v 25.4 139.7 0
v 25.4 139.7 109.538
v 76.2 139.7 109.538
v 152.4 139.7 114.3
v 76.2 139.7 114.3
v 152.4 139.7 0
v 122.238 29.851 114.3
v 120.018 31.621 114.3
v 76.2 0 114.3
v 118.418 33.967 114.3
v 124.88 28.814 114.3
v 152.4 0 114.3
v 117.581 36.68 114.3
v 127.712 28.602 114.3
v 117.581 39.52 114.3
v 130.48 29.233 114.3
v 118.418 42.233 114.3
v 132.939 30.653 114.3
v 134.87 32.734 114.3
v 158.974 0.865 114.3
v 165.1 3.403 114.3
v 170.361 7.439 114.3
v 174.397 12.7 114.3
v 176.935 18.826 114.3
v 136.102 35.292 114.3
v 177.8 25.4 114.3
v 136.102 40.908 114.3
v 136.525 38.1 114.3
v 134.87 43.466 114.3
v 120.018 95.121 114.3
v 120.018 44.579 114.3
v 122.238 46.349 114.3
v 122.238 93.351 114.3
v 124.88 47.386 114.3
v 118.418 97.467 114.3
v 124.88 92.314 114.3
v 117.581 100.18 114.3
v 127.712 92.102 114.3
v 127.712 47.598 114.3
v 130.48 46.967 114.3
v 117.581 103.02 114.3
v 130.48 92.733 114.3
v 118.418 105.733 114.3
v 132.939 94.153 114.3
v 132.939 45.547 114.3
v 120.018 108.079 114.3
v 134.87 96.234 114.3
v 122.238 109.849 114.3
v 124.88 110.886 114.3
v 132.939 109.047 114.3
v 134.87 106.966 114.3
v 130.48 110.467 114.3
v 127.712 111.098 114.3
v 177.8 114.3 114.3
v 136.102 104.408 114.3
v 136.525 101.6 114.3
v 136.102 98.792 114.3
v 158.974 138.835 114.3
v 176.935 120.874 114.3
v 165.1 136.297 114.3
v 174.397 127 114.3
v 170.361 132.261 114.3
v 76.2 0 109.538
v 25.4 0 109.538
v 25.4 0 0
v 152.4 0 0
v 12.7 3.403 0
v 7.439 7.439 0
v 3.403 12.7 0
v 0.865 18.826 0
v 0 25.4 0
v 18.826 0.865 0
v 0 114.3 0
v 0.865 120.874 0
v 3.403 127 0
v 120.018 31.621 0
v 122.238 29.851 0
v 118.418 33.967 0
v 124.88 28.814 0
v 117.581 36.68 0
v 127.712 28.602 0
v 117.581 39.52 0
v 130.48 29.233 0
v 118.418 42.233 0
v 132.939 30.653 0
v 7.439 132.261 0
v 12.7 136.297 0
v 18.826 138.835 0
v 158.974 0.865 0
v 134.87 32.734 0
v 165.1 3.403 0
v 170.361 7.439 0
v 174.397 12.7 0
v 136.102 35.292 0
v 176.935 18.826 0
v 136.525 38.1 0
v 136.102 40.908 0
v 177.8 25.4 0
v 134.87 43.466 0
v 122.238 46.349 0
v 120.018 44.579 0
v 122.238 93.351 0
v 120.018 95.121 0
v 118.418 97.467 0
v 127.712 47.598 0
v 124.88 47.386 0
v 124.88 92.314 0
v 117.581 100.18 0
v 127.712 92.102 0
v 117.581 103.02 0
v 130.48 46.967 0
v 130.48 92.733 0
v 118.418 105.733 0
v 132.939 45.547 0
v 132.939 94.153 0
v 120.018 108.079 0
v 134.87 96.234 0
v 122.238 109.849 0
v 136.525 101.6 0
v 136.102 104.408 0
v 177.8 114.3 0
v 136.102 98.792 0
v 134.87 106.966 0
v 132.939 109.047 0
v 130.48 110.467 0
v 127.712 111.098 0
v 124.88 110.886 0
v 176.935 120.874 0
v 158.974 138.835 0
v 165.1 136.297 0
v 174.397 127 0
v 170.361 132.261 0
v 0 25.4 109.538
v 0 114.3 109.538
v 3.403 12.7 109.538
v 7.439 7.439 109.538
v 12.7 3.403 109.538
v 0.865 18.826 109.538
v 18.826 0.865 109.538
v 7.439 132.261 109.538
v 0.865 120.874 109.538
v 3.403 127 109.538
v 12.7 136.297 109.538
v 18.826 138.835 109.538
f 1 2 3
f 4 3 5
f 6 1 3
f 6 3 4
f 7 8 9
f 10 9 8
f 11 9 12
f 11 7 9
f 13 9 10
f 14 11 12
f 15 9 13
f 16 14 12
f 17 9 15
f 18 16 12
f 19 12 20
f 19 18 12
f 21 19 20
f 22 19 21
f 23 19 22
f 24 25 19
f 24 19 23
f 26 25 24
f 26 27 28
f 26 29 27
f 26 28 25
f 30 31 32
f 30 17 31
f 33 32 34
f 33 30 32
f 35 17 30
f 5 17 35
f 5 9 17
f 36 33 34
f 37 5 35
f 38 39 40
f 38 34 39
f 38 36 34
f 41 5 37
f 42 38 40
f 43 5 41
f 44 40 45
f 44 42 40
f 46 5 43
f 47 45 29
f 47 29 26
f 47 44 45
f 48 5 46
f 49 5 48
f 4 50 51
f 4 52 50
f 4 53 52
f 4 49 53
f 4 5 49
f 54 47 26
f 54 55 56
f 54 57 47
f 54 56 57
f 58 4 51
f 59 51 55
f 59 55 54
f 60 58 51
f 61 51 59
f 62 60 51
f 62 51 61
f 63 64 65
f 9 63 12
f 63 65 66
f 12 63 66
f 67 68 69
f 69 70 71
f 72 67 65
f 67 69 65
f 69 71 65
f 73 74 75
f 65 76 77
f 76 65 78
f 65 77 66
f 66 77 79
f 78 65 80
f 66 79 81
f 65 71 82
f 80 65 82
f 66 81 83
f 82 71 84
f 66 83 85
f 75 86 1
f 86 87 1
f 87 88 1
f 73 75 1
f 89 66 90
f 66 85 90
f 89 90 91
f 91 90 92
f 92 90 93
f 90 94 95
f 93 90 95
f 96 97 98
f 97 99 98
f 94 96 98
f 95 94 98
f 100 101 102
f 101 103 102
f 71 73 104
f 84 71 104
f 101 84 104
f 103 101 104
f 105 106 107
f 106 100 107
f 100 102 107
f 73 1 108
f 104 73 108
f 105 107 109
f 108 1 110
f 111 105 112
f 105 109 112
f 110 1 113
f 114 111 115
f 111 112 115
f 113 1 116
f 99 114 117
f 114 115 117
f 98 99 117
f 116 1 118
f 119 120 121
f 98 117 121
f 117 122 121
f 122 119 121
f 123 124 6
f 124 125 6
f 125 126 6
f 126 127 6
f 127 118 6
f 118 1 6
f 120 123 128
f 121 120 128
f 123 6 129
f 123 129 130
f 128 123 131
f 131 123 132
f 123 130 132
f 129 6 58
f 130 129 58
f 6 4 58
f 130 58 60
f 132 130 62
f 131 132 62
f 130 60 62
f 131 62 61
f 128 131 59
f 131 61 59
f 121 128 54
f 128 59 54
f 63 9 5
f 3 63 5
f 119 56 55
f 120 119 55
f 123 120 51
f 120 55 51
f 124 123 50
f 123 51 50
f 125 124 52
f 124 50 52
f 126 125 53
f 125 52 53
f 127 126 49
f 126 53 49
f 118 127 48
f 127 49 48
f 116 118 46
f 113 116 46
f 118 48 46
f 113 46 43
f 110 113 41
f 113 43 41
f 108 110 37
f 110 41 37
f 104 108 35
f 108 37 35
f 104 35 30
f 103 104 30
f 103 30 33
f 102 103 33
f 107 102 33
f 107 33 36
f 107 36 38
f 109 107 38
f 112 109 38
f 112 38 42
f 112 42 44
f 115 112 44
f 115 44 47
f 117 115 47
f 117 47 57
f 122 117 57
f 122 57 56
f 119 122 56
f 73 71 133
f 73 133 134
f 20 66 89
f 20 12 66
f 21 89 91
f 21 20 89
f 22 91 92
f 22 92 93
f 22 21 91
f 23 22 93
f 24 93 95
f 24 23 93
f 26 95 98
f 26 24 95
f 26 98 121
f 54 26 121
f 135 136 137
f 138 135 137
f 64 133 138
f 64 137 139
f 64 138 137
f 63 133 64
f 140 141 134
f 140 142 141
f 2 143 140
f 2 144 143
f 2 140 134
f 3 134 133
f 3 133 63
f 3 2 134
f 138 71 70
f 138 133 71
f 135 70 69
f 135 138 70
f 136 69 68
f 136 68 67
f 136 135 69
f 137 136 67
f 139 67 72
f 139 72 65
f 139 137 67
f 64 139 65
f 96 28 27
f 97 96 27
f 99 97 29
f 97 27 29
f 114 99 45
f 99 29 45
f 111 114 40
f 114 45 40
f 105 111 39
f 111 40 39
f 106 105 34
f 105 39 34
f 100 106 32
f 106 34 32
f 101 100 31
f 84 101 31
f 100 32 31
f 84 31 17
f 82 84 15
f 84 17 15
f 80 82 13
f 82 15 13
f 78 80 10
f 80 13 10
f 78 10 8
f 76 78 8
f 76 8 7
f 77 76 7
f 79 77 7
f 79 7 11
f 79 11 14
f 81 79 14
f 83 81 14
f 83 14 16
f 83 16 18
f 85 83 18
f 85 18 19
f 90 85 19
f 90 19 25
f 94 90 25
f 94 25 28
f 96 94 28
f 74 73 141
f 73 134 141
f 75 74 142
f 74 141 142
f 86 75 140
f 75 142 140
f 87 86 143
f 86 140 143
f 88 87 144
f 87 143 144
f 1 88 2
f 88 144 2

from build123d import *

# Parameters (mm, degrees)
F0_W     = 177.8
F0_H     = 139.7
F1_DEPTH = 114.3
F2_W     = 76.2
F2_H     = 139.7
F3_DEPTH = 4.7625
F4_R     = 9.525
F5_DEPTH = 114.301
F6_R     = 25.4


with BuildPart() as f1:
    # F0 (on Top) → F1 (new body)
    with BuildSketch(Plane.XY):
        with Locations((88.9, 69.85)):
            Rectangle(F0_W, F0_H)
    extrude(amount=F1_DEPTH)

    # F2 (on face) → F3 (cut)
    with BuildSketch(Plane.XY.offset(114.3)):
        with Locations((38.1, 69.85)):
            Rectangle(F2_W, F2_H)
    extrude(amount=-F3_DEPTH, mode=Mode.SUBTRACT)

    # F4 (on face) → F5 (cut, through all)
    with BuildSketch(Plane.XY.offset(114.3)):
        with Locations((127, 101.6)):
            Circle(F4_R)
        with Locations((127, 38.1)):
            Circle(F4_R)
    extrude(amount=-F5_DEPTH, mode=Mode.SUBTRACT)

    # F6
    f6_edges = [f1.edges().sort_by_distance(p)[0] for p in [
        (0, 0, 54.76875),
        (177.8, 0, 57.15),
        (177.8, 139.7, 57.15),
        (0, 139.7, 54.76875),
    ]]
    fillet(f6_edges, radius=F6_R)


solid = f1.part
